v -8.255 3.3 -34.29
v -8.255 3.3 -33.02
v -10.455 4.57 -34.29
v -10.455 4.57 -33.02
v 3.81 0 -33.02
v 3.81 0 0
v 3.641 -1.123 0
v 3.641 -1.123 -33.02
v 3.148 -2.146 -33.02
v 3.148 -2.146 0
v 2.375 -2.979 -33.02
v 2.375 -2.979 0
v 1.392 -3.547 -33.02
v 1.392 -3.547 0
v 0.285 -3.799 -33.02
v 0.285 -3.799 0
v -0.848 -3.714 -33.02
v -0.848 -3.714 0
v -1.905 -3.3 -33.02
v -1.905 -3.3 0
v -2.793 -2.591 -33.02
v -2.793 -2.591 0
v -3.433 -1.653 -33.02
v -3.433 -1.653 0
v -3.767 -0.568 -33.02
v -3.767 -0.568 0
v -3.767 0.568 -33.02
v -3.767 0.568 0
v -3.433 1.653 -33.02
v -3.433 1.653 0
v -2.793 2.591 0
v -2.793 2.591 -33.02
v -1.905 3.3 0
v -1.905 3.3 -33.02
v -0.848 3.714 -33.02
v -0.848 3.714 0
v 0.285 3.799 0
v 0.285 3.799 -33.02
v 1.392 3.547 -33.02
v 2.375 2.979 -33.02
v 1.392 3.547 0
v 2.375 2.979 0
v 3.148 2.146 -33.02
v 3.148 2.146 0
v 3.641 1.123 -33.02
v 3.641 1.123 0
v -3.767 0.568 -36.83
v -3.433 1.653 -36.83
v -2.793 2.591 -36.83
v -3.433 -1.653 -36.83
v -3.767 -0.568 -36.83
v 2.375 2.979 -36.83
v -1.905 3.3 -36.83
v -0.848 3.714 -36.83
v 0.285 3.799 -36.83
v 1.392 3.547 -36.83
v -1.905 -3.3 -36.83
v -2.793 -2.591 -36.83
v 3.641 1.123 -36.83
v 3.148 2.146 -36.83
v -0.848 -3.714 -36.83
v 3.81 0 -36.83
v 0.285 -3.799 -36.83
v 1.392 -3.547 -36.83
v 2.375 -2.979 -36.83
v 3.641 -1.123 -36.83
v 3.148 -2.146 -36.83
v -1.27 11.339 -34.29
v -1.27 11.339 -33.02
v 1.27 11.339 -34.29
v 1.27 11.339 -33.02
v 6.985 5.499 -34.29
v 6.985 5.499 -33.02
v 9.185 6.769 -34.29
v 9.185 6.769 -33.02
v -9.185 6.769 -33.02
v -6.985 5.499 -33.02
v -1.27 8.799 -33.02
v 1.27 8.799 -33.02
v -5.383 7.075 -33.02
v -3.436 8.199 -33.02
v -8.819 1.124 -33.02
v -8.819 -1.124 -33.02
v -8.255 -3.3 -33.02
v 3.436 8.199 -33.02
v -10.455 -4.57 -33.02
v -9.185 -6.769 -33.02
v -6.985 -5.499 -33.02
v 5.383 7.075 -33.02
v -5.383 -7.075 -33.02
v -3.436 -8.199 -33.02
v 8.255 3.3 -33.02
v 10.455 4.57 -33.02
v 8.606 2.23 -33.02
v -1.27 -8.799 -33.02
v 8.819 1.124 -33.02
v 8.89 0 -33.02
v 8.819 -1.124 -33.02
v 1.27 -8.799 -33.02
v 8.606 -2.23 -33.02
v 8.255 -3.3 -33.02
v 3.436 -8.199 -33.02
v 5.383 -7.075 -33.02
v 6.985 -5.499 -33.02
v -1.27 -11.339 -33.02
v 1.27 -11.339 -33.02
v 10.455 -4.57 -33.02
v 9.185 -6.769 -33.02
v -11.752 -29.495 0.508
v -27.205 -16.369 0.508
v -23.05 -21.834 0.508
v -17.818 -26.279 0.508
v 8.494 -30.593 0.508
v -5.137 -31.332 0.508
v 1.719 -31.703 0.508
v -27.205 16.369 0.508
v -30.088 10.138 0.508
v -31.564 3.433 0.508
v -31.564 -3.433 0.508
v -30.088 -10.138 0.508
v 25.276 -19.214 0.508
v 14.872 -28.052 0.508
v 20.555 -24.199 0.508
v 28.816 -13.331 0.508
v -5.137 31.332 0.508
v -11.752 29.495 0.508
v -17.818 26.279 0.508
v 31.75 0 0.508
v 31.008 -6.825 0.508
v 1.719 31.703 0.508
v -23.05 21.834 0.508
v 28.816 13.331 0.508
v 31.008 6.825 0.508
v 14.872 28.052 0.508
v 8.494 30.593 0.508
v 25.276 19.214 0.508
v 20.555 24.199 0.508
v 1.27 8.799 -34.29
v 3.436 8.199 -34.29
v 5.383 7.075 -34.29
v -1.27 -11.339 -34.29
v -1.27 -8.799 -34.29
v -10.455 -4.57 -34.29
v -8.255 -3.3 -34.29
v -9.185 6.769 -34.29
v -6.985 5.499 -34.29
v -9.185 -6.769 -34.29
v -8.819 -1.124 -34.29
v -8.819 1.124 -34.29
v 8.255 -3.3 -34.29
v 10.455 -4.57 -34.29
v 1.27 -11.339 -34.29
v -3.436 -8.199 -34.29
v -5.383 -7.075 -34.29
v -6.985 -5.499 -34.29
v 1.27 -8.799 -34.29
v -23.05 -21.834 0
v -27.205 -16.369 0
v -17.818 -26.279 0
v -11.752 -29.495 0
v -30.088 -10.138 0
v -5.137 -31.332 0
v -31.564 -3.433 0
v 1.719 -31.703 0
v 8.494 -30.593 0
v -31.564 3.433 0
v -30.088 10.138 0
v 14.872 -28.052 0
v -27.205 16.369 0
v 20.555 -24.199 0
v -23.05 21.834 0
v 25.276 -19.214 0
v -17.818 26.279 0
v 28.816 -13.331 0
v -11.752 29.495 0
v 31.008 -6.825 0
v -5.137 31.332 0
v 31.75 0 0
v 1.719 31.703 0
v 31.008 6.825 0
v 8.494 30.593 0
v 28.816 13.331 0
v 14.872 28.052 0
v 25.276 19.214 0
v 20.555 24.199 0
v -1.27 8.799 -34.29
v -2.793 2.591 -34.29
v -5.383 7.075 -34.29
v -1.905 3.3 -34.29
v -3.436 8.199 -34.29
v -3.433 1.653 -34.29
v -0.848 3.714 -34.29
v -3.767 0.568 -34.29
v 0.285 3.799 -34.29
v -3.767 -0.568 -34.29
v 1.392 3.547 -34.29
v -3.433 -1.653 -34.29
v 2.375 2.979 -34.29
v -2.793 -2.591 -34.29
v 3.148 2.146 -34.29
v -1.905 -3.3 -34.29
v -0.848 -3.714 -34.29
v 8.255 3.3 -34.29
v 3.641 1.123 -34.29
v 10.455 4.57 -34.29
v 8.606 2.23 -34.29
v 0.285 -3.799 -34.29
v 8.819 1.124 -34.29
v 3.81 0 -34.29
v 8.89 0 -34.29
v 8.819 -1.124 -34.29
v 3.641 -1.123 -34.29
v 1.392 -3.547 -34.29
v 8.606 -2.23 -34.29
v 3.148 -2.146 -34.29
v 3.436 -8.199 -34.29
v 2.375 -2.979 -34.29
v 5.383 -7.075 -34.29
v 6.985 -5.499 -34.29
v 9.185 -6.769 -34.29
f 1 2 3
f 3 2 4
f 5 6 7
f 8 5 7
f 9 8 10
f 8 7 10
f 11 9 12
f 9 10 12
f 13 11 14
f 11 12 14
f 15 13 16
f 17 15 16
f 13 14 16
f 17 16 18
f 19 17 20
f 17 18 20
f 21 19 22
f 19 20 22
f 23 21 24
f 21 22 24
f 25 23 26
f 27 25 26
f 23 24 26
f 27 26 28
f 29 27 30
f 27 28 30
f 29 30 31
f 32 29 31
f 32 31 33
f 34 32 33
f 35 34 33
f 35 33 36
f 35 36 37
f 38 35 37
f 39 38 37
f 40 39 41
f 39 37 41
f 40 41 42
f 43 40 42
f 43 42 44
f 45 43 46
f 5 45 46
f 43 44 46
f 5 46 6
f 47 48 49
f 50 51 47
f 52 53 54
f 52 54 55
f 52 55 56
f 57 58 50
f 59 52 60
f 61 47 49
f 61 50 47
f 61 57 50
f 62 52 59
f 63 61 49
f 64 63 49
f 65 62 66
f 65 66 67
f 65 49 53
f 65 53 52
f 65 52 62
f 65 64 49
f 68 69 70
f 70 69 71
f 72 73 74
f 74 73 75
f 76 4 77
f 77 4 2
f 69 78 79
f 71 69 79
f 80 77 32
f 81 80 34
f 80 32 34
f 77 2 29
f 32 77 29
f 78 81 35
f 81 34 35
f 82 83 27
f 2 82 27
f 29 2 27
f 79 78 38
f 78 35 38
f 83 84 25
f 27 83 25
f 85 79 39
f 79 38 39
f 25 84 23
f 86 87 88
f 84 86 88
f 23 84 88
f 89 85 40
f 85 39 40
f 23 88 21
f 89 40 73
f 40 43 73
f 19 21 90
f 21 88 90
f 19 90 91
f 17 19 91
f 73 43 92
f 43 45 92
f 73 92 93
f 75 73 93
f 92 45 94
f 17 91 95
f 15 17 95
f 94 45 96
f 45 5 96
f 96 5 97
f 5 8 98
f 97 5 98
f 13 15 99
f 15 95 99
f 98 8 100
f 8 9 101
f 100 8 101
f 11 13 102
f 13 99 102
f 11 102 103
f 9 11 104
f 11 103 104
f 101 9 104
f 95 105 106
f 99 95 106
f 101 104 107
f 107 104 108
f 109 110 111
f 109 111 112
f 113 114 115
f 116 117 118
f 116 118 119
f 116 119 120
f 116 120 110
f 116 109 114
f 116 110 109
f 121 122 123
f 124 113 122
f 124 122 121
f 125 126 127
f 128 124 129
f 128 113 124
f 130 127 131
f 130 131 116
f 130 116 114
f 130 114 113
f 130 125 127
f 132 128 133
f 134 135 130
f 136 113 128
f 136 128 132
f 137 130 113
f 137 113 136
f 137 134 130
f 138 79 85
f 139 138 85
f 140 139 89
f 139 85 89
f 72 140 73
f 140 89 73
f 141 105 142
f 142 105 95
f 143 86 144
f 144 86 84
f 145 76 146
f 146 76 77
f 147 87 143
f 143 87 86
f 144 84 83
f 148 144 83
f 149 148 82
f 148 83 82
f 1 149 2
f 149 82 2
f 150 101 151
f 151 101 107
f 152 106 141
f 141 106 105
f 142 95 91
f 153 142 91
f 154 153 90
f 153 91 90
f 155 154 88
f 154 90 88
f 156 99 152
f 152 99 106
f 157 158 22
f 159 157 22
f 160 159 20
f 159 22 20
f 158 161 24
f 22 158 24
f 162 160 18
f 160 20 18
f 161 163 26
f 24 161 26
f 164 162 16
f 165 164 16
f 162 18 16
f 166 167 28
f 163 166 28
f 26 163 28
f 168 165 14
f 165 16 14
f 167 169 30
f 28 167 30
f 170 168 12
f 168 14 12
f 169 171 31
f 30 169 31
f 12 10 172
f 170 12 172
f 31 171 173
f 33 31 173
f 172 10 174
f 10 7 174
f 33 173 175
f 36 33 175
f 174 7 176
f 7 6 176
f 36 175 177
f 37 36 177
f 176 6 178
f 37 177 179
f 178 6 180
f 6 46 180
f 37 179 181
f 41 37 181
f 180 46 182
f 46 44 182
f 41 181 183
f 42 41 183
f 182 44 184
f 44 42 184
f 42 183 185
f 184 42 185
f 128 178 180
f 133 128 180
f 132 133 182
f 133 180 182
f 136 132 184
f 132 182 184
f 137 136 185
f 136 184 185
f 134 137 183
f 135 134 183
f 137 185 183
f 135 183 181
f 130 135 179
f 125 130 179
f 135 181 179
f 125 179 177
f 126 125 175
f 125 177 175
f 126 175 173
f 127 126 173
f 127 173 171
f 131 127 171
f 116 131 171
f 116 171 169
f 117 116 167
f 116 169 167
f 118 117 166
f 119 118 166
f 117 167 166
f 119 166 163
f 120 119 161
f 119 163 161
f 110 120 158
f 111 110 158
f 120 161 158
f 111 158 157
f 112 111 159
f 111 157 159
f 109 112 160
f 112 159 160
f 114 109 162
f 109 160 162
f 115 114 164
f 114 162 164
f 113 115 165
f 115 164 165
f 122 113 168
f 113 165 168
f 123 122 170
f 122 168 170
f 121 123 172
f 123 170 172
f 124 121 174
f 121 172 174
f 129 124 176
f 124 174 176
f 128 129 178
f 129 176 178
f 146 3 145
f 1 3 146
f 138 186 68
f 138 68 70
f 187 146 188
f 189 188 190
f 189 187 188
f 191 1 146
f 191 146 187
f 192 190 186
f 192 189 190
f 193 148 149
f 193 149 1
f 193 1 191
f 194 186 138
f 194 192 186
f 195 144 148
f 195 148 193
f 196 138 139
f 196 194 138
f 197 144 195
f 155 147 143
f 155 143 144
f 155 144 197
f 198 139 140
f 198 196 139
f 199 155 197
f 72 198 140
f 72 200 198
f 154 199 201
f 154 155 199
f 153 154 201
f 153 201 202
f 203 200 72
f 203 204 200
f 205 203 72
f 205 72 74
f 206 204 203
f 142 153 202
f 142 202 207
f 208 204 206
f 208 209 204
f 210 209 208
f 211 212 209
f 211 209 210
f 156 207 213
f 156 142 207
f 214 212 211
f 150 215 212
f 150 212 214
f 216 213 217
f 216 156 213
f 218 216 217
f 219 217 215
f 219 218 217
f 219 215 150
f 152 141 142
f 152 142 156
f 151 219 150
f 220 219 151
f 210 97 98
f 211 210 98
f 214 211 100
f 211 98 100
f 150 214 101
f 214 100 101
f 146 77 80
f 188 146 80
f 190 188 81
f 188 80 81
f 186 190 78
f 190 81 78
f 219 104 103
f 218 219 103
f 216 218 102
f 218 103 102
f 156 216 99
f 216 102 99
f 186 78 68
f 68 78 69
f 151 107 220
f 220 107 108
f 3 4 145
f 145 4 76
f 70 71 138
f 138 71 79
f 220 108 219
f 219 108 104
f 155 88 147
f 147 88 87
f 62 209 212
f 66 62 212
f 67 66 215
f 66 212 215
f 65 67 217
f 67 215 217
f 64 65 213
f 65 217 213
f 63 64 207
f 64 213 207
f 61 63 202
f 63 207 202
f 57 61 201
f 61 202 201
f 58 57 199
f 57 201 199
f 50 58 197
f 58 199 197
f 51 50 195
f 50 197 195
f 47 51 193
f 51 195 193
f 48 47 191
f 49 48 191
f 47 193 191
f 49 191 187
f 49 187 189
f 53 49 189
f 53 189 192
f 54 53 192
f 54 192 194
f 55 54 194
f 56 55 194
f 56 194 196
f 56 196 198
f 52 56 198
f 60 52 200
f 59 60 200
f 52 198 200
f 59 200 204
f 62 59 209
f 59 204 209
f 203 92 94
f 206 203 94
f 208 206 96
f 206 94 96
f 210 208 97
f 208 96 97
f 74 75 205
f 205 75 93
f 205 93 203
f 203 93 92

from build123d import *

# Parameters (mm, degrees)
F0_R     = 31.75
F1_DEPTH = 0.508
F2_R     = 3.81
F3_DEPTH = 33.02
F4_R     = 3.81
F5_DEPTH = 1.27
F6_R     = 3.81
F7_DEPTH = 2.54


with BuildPart() as f1:
    # F0 (on Top) → F1 (new body)
    with BuildSketch(Plane.XY):
        Circle(F0_R)
    extrude(amount=F1_DEPTH)

    # F2 (on face) → F3 (join)
    with BuildSketch(Plane(origin=(0, 0, 0), x_dir=(1, 0, 0), z_dir=(0, 0, -1))):
        Circle(F2_R)
    extrude(amount=F3_DEPTH)

    # F4 (on face) → F5 (join)
    with BuildSketch(Plane(origin=(0, 0, -33.02), x_dir=(1, 0, 0), z_dir=(0, 0, -1))):
        with BuildLine():
            ThreePointArc((8.255, -3.2995567884), (8.7298066989, -1.6800520825), (8.89, 0))
            ThreePointArc((8.89, 0), (8.7298066989, 1.6800520825), (8.255, 3.2995567884))
            ThreePointArc((8.255, 3.2995567884), (7.6989658396, 4.445), (6.985, 5.499261314))
            ThreePointArc((6.985, 5.499261314), (4.445, 7.6989658396), (1.27, 8.7988181024))
            ThreePointArc((1.27, 8.7988181024), (0, 8.89), (-1.27, 8.7988181024))
            ThreePointArc((-1.27, 8.7988181024), (-4.445, 7.6989658396), (-6.985, 5.499261314))
            ThreePointArc((-6.985, 5.499261314), (-7.6989658396, 4.445), (-8.255, 3.2995567884))
            ThreePointArc((-8.255, 3.2995567884), (-8.89, 0), (-8.255, -3.2995567884))
            ThreePointArc((-8.255, -3.2995567884), (-7.6989658396, -4.445), (-6.985, -5.499261314))
            ThreePointArc((-6.985, -5.499261314), (-4.445, -7.6989658396), (-1.27, -8.7988181024))
            ThreePointArc((-1.27, -8.7988181024), (0, -8.89), (1.27, -8.7988181024))
            ThreePointArc((1.27, -8.7988181024), (4.445, -7.6989658396), (6.985, -5.499261314))
            ThreePointArc((6.985, -5.499261314), (7.6989658396, -4.445), (8.255, -3.2995567884))
        make_face()
        Circle(F4_R, mode=Mode.SUBTRACT)
        Circle(F4_R)
        with BuildLine():
            ThreePointArc((-1.27, 8.7988181024), (0, 8.89), (1.27, 8.7988181024))
            Line((1.27, 8.7988181024), (1.27, 11.3388181024))
            Line((1.27, 11.3388181024), (-1.27, 11.3388181024))
            Line((-1.27, 11.3388181024), (-1.27, 8.7988181024))
        make_face()
        with BuildLine():
            ThreePointArc((6.985, 5.499261314), (7.6989658396, 4.445), (8.255, 3.2995567884))
            Line((8.255, 3.2995567884), (10.4547045256, 4.5695567884))
            Line((10.4547045256, 4.5695567884), (9.1847045256, 6.769261314))
            Line((9.1847045256, 6.769261314), (6.985, 5.499261314))
        make_face()
        with BuildLine():
            Line((10.4547045256, -4.5695567884), (8.255, -3.2995567884))
            ThreePointArc((8.255, -3.2995567884), (7.6989658396, -4.445), (6.985, -5.499261314))
            Line((6.985, -5.499261314), (9.1847045256, -6.769261314))
            Line((9.1847045256, -6.769261314), (10.4547045256, -4.5695567884))
        make_face()
        with BuildLine():
            Line((1.27, -11.3388181024), (1.27, -8.7988181024))
            ThreePointArc((1.27, -8.7988181024), (0, -8.89), (-1.27, -8.7988181024))
            Line((-1.27, -8.7988181024), (-1.27, -11.3388181024))
            Line((-1.27, -11.3388181024), (1.27, -11.3388181024))
        make_face()
        with BuildLine():
            Line((-9.1847045256, -6.769261314), (-6.985, -5.499261314))
            ThreePointArc((-6.985, -5.499261314), (-7.6989658396, -4.445), (-8.255, -3.2995567884))
            Line((-8.255, -3.2995567884), (-10.4547045256, -4.5695567884))
            Line((-10.4547045256, -4.5695567884), (-9.1847045256, -6.769261314))
        make_face()
        with BuildLine():
            ThreePointArc((-8.255, 3.2995567884), (-7.6989658396, 4.445), (-6.985, 5.499261314))
            Line((-6.985, 5.499261314), (-9.1847045256, 6.769261314))
            Line((-9.1847045256, 6.769261314), (-10.4547045256, 4.5695567884))
            Line((-10.4547045256, 4.5695567884), (-8.255, 3.2995567884))
        make_face()
    extrude(amount=F5_DEPTH)

    # F6 (on face) → F7 (join)
    with BuildSketch(Plane(origin=(0, 0, -34.29), x_dir=(1, 0, 0), z_dir=(0, 0, -1))):
        Circle(F6_R)
    extrude(amount=F7_DEPTH)


solid = f1.part
